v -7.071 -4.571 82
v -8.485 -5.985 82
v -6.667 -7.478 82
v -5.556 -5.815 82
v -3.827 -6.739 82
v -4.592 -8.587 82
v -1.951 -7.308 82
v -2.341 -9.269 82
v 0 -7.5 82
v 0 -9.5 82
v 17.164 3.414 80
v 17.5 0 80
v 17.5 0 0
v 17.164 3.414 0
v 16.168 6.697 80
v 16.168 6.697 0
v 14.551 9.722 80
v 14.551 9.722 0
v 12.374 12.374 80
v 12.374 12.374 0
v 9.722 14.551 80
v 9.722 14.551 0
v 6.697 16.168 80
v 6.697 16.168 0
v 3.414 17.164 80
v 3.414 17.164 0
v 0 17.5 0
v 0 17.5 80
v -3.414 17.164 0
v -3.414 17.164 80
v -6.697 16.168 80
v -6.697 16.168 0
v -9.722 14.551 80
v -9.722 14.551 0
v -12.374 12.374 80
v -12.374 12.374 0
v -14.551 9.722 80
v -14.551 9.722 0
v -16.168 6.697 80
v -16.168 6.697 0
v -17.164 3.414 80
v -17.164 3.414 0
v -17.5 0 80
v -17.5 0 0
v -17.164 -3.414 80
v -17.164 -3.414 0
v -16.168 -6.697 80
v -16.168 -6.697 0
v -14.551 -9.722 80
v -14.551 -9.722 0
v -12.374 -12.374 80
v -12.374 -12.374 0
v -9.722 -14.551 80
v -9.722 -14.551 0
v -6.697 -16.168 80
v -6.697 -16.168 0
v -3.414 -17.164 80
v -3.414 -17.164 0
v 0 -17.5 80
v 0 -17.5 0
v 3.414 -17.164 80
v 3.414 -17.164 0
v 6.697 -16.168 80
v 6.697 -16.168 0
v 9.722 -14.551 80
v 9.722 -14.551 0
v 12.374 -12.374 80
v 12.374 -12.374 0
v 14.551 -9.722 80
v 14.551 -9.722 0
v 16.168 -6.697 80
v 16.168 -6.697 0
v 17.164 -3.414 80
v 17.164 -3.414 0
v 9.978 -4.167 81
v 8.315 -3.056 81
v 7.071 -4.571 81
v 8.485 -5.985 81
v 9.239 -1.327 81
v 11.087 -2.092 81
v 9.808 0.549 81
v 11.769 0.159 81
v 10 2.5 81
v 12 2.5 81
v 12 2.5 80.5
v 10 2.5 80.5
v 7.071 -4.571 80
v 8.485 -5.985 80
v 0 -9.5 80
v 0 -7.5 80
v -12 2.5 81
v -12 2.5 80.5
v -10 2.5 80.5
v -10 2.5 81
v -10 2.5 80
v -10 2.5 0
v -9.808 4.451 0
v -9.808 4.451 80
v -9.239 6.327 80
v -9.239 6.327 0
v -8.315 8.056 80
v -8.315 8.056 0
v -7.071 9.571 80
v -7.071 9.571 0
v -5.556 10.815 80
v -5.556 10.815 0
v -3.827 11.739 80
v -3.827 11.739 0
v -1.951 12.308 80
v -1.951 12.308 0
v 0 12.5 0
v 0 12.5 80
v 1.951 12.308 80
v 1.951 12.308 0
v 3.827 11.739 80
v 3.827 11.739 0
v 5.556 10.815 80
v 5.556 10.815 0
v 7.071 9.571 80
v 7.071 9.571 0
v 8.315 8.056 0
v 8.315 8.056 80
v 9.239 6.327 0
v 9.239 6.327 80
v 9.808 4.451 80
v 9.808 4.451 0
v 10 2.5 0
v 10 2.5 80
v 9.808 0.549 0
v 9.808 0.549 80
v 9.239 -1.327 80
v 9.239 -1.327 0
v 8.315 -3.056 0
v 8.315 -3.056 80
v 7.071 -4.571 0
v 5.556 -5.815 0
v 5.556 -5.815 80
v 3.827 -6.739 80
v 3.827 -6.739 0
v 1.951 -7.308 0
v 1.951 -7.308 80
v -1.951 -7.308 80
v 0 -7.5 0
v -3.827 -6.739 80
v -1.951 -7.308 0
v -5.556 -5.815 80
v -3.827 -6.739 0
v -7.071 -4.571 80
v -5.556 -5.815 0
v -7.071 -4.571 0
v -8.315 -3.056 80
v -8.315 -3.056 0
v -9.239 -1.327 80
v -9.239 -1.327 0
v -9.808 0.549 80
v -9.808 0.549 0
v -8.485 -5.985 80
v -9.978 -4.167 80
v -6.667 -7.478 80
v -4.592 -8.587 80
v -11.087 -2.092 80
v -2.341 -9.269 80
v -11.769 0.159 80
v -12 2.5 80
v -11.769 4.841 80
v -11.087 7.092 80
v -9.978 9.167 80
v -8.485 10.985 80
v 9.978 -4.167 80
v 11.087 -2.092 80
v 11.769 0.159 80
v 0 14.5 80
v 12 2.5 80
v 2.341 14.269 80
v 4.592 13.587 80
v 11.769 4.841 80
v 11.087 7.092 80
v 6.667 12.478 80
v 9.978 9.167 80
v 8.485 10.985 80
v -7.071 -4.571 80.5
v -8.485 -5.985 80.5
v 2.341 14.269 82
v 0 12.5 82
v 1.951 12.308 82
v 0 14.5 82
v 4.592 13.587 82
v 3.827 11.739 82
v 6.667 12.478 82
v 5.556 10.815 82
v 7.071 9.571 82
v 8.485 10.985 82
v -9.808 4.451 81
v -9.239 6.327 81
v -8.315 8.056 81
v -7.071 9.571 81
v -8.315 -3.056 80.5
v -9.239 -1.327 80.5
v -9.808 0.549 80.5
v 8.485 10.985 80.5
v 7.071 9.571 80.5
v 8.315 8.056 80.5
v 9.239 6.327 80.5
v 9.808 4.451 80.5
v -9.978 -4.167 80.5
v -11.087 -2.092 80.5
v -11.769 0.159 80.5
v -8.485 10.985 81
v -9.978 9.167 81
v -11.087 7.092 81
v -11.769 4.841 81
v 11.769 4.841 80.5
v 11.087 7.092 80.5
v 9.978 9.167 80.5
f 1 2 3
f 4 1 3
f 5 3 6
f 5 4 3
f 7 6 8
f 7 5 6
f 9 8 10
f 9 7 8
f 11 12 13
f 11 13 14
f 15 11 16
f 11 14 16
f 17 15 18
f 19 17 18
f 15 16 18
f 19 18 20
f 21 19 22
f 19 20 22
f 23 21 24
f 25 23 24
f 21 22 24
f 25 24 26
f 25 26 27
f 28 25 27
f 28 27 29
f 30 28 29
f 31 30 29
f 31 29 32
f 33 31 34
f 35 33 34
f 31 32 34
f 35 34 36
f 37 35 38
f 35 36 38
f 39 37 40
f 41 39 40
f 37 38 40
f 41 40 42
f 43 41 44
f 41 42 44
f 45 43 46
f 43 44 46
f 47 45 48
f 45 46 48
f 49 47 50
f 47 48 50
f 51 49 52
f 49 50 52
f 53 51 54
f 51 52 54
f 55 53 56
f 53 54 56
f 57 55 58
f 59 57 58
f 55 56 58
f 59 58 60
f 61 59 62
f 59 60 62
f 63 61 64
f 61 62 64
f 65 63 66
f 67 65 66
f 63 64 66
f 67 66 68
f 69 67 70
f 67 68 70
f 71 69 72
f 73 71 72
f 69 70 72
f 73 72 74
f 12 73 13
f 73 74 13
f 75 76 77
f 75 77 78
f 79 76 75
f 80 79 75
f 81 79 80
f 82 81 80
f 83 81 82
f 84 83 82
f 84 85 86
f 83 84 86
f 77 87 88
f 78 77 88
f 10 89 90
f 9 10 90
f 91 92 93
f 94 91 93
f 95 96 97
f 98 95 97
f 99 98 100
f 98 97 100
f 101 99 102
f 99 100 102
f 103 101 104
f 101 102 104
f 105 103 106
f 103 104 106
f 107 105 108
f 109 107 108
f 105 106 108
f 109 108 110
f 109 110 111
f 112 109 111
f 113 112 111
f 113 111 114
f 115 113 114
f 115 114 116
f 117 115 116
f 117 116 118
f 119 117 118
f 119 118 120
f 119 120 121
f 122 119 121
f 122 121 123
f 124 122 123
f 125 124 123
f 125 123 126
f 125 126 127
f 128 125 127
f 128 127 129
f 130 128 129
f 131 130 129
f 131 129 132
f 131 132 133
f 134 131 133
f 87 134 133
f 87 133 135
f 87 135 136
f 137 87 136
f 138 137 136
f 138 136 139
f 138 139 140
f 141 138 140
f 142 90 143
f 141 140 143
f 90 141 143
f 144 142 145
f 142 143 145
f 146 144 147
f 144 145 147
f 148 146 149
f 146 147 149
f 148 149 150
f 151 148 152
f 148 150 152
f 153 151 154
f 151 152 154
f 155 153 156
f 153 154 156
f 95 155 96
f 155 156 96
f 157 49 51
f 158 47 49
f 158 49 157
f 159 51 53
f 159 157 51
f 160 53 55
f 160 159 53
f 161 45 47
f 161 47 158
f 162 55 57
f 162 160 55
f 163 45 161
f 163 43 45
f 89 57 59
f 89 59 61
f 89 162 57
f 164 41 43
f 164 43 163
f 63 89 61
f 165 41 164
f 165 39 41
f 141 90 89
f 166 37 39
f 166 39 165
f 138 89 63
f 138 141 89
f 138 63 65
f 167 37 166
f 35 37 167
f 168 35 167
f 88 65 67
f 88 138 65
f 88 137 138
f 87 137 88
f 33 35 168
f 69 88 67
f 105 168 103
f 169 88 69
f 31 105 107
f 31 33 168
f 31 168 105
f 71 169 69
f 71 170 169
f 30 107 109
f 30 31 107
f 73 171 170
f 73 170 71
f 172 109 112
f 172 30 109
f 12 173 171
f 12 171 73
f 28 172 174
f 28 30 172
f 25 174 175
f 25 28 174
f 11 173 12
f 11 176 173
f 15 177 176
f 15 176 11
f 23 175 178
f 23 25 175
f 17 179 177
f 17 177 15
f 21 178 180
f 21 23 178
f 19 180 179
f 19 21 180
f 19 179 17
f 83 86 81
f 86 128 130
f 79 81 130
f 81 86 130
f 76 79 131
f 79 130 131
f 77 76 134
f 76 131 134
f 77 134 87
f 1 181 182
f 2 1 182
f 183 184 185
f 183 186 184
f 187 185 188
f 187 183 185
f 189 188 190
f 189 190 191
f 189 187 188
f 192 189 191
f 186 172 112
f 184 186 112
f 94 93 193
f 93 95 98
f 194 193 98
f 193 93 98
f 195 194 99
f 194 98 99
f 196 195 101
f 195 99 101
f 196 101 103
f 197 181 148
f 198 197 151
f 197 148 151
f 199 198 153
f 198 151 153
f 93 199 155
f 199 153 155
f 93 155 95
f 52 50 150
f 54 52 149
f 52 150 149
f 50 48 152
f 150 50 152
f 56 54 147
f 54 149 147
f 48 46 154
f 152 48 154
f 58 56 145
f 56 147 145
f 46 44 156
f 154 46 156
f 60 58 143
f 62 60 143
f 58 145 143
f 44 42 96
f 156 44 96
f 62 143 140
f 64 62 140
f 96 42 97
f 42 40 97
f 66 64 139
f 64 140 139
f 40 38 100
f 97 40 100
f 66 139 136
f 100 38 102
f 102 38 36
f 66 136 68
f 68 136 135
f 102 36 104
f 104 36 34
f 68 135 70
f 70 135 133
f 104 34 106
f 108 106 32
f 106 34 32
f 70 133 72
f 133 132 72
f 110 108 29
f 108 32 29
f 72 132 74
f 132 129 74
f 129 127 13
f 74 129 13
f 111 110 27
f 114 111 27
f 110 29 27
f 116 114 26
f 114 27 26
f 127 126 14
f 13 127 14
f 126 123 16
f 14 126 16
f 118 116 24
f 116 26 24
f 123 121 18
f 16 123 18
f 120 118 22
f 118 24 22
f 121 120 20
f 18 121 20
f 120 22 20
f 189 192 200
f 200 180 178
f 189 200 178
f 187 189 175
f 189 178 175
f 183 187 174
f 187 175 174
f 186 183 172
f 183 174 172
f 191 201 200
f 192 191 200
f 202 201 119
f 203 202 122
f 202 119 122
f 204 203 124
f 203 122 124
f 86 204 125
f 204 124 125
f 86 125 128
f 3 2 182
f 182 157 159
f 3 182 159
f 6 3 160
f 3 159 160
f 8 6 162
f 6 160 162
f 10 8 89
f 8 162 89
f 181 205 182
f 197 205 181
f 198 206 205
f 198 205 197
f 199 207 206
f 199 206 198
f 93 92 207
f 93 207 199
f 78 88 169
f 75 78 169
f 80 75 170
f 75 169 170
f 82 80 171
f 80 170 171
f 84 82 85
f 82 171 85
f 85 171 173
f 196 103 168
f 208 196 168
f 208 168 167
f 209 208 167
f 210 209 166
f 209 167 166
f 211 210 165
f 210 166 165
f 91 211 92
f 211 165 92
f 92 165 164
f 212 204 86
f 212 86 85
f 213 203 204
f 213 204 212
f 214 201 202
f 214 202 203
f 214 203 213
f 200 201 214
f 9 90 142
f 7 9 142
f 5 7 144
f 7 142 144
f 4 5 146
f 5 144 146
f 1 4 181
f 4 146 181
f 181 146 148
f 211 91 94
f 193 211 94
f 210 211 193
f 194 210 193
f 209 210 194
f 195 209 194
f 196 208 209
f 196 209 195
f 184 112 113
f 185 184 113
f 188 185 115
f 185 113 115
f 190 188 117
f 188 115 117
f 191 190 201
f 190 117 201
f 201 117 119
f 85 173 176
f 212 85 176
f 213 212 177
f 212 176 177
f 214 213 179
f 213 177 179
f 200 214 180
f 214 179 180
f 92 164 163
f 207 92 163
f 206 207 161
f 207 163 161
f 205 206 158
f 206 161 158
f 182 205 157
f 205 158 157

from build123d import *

# Parameters (mm, degrees)
F2_R      = 17.5
F3_DEPTH  = 80
F6_D      = 20
F8_DEPTH  = 2
F10_DEPTH = 0.5
F12_DEPTH = 1


with BuildPart() as f3:
    # F2 (on Top) → F3 (new body)
    with BuildSketch(Plane.XY):
        Circle(F2_R)
    extrude(amount=F3_DEPTH)

    # F6 (through all)
    with Locations(Plane.XY.offset(80)):
        with Locations((0, 2.5)):
            Hole(F6_D / 2)

    # F7 (on offset) → F8 (join)
    with BuildSketch(Plane.XY.offset(80)):
        with BuildLine():
            Line((0, -9.5), (0, -7.5))
            ThreePointArc((0, -7.5), (-3.8268343237, -6.7387953251), (-7.0710678119, -4.5710678119))
            Line((-7.0710678119, -4.5710678119), (-8.4852813742, -5.9852813742))
            ThreePointArc((-8.4852813742, -5.9852813742), (-4.5922011884, -8.5865543901), (0, -9.5))
        make_face()
        with BuildLine():
            Line((0, 14.4321346406), (0, 12.5))
            ThreePointArc((0, 12.5), (3.8268343237, 11.7387953251), (7.0710678119, 9.5710678119))
            Line((7.0710678119, 9.5710678119), (8.4852813742, 10.9852813742))
            ThreePointArc((8.4852813742, 10.9852813742), (4.5922011884, 13.5865543901), (0, 14.5))
            Line((0, 14.5), (0, 14.4321346406))
        make_face()
    extrude(amount=F8_DEPTH)

    # F9 (on offset) → F10 (join)
    with BuildSketch(Plane.XY.offset(80)):
        with BuildLine():
            Line((-8.4852813742, -5.9852813742), (-7.0710678119, -4.5710678119))
            ThreePointArc((-7.0710678119, -4.5710678119), (-9.2387953251, -1.3268343237), (-10, 2.5))
            Line((-10, 2.5), (-12, 2.5))
            ThreePointArc((-12, 2.5), (-11.0865543901, -2.0922011884), (-8.4852813742, -5.9852813742))
        make_face()
        with BuildLine():
            Line((8.4328658848, 10.9328658848), (7.0710678119, 9.5710678119))
            ThreePointArc((7.0710678119, 9.5710678119), (9.2387953251, 6.3268343237), (10, 2.5))
            Line((10, 2.5), (12, 2.5))
            ThreePointArc((12, 2.5), (11.0865543901, 7.0922011884), (8.4852813742, 10.9852813742))
            Line((8.4852813742, 10.9852813742), (8.4328658848, 10.9328658848))
        make_face()
    extrude(amount=F10_DEPTH)

    # F11 (on offset) → F12 (join)
    with BuildSketch(Plane.XY.offset(80)):
        with BuildLine():
            Line((-12, 2.5), (-10, 2.5))
            ThreePointArc((-10, 2.5), (-9.2387953251, 6.3268343237), (-7.0710678119, 9.5710678119))
            Line((-7.0710678119, 9.5710678119), (-8.4852813742, 10.9852813742))
            ThreePointArc((-8.4852813742, 10.9852813742), (-11.0865543901, 7.0922011884), (-12, 2.5))
        make_face()
        with BuildLine():
            Line((12, 2.5), (10, 2.5))
            ThreePointArc((10, 2.5), (9.2387953251, -1.3268343237), (7.0710678119, -4.5710678119))
            Line((7.0710678119, -4.5710678119), (8.4852813742, -5.9852813742))
            ThreePointArc((8.4852813742, -5.9852813742), (11.0865543901, -2.0922011884), (12, 2.5))
        make_face()
    extrude(amount=F12_DEPTH)


solid = f3.part
